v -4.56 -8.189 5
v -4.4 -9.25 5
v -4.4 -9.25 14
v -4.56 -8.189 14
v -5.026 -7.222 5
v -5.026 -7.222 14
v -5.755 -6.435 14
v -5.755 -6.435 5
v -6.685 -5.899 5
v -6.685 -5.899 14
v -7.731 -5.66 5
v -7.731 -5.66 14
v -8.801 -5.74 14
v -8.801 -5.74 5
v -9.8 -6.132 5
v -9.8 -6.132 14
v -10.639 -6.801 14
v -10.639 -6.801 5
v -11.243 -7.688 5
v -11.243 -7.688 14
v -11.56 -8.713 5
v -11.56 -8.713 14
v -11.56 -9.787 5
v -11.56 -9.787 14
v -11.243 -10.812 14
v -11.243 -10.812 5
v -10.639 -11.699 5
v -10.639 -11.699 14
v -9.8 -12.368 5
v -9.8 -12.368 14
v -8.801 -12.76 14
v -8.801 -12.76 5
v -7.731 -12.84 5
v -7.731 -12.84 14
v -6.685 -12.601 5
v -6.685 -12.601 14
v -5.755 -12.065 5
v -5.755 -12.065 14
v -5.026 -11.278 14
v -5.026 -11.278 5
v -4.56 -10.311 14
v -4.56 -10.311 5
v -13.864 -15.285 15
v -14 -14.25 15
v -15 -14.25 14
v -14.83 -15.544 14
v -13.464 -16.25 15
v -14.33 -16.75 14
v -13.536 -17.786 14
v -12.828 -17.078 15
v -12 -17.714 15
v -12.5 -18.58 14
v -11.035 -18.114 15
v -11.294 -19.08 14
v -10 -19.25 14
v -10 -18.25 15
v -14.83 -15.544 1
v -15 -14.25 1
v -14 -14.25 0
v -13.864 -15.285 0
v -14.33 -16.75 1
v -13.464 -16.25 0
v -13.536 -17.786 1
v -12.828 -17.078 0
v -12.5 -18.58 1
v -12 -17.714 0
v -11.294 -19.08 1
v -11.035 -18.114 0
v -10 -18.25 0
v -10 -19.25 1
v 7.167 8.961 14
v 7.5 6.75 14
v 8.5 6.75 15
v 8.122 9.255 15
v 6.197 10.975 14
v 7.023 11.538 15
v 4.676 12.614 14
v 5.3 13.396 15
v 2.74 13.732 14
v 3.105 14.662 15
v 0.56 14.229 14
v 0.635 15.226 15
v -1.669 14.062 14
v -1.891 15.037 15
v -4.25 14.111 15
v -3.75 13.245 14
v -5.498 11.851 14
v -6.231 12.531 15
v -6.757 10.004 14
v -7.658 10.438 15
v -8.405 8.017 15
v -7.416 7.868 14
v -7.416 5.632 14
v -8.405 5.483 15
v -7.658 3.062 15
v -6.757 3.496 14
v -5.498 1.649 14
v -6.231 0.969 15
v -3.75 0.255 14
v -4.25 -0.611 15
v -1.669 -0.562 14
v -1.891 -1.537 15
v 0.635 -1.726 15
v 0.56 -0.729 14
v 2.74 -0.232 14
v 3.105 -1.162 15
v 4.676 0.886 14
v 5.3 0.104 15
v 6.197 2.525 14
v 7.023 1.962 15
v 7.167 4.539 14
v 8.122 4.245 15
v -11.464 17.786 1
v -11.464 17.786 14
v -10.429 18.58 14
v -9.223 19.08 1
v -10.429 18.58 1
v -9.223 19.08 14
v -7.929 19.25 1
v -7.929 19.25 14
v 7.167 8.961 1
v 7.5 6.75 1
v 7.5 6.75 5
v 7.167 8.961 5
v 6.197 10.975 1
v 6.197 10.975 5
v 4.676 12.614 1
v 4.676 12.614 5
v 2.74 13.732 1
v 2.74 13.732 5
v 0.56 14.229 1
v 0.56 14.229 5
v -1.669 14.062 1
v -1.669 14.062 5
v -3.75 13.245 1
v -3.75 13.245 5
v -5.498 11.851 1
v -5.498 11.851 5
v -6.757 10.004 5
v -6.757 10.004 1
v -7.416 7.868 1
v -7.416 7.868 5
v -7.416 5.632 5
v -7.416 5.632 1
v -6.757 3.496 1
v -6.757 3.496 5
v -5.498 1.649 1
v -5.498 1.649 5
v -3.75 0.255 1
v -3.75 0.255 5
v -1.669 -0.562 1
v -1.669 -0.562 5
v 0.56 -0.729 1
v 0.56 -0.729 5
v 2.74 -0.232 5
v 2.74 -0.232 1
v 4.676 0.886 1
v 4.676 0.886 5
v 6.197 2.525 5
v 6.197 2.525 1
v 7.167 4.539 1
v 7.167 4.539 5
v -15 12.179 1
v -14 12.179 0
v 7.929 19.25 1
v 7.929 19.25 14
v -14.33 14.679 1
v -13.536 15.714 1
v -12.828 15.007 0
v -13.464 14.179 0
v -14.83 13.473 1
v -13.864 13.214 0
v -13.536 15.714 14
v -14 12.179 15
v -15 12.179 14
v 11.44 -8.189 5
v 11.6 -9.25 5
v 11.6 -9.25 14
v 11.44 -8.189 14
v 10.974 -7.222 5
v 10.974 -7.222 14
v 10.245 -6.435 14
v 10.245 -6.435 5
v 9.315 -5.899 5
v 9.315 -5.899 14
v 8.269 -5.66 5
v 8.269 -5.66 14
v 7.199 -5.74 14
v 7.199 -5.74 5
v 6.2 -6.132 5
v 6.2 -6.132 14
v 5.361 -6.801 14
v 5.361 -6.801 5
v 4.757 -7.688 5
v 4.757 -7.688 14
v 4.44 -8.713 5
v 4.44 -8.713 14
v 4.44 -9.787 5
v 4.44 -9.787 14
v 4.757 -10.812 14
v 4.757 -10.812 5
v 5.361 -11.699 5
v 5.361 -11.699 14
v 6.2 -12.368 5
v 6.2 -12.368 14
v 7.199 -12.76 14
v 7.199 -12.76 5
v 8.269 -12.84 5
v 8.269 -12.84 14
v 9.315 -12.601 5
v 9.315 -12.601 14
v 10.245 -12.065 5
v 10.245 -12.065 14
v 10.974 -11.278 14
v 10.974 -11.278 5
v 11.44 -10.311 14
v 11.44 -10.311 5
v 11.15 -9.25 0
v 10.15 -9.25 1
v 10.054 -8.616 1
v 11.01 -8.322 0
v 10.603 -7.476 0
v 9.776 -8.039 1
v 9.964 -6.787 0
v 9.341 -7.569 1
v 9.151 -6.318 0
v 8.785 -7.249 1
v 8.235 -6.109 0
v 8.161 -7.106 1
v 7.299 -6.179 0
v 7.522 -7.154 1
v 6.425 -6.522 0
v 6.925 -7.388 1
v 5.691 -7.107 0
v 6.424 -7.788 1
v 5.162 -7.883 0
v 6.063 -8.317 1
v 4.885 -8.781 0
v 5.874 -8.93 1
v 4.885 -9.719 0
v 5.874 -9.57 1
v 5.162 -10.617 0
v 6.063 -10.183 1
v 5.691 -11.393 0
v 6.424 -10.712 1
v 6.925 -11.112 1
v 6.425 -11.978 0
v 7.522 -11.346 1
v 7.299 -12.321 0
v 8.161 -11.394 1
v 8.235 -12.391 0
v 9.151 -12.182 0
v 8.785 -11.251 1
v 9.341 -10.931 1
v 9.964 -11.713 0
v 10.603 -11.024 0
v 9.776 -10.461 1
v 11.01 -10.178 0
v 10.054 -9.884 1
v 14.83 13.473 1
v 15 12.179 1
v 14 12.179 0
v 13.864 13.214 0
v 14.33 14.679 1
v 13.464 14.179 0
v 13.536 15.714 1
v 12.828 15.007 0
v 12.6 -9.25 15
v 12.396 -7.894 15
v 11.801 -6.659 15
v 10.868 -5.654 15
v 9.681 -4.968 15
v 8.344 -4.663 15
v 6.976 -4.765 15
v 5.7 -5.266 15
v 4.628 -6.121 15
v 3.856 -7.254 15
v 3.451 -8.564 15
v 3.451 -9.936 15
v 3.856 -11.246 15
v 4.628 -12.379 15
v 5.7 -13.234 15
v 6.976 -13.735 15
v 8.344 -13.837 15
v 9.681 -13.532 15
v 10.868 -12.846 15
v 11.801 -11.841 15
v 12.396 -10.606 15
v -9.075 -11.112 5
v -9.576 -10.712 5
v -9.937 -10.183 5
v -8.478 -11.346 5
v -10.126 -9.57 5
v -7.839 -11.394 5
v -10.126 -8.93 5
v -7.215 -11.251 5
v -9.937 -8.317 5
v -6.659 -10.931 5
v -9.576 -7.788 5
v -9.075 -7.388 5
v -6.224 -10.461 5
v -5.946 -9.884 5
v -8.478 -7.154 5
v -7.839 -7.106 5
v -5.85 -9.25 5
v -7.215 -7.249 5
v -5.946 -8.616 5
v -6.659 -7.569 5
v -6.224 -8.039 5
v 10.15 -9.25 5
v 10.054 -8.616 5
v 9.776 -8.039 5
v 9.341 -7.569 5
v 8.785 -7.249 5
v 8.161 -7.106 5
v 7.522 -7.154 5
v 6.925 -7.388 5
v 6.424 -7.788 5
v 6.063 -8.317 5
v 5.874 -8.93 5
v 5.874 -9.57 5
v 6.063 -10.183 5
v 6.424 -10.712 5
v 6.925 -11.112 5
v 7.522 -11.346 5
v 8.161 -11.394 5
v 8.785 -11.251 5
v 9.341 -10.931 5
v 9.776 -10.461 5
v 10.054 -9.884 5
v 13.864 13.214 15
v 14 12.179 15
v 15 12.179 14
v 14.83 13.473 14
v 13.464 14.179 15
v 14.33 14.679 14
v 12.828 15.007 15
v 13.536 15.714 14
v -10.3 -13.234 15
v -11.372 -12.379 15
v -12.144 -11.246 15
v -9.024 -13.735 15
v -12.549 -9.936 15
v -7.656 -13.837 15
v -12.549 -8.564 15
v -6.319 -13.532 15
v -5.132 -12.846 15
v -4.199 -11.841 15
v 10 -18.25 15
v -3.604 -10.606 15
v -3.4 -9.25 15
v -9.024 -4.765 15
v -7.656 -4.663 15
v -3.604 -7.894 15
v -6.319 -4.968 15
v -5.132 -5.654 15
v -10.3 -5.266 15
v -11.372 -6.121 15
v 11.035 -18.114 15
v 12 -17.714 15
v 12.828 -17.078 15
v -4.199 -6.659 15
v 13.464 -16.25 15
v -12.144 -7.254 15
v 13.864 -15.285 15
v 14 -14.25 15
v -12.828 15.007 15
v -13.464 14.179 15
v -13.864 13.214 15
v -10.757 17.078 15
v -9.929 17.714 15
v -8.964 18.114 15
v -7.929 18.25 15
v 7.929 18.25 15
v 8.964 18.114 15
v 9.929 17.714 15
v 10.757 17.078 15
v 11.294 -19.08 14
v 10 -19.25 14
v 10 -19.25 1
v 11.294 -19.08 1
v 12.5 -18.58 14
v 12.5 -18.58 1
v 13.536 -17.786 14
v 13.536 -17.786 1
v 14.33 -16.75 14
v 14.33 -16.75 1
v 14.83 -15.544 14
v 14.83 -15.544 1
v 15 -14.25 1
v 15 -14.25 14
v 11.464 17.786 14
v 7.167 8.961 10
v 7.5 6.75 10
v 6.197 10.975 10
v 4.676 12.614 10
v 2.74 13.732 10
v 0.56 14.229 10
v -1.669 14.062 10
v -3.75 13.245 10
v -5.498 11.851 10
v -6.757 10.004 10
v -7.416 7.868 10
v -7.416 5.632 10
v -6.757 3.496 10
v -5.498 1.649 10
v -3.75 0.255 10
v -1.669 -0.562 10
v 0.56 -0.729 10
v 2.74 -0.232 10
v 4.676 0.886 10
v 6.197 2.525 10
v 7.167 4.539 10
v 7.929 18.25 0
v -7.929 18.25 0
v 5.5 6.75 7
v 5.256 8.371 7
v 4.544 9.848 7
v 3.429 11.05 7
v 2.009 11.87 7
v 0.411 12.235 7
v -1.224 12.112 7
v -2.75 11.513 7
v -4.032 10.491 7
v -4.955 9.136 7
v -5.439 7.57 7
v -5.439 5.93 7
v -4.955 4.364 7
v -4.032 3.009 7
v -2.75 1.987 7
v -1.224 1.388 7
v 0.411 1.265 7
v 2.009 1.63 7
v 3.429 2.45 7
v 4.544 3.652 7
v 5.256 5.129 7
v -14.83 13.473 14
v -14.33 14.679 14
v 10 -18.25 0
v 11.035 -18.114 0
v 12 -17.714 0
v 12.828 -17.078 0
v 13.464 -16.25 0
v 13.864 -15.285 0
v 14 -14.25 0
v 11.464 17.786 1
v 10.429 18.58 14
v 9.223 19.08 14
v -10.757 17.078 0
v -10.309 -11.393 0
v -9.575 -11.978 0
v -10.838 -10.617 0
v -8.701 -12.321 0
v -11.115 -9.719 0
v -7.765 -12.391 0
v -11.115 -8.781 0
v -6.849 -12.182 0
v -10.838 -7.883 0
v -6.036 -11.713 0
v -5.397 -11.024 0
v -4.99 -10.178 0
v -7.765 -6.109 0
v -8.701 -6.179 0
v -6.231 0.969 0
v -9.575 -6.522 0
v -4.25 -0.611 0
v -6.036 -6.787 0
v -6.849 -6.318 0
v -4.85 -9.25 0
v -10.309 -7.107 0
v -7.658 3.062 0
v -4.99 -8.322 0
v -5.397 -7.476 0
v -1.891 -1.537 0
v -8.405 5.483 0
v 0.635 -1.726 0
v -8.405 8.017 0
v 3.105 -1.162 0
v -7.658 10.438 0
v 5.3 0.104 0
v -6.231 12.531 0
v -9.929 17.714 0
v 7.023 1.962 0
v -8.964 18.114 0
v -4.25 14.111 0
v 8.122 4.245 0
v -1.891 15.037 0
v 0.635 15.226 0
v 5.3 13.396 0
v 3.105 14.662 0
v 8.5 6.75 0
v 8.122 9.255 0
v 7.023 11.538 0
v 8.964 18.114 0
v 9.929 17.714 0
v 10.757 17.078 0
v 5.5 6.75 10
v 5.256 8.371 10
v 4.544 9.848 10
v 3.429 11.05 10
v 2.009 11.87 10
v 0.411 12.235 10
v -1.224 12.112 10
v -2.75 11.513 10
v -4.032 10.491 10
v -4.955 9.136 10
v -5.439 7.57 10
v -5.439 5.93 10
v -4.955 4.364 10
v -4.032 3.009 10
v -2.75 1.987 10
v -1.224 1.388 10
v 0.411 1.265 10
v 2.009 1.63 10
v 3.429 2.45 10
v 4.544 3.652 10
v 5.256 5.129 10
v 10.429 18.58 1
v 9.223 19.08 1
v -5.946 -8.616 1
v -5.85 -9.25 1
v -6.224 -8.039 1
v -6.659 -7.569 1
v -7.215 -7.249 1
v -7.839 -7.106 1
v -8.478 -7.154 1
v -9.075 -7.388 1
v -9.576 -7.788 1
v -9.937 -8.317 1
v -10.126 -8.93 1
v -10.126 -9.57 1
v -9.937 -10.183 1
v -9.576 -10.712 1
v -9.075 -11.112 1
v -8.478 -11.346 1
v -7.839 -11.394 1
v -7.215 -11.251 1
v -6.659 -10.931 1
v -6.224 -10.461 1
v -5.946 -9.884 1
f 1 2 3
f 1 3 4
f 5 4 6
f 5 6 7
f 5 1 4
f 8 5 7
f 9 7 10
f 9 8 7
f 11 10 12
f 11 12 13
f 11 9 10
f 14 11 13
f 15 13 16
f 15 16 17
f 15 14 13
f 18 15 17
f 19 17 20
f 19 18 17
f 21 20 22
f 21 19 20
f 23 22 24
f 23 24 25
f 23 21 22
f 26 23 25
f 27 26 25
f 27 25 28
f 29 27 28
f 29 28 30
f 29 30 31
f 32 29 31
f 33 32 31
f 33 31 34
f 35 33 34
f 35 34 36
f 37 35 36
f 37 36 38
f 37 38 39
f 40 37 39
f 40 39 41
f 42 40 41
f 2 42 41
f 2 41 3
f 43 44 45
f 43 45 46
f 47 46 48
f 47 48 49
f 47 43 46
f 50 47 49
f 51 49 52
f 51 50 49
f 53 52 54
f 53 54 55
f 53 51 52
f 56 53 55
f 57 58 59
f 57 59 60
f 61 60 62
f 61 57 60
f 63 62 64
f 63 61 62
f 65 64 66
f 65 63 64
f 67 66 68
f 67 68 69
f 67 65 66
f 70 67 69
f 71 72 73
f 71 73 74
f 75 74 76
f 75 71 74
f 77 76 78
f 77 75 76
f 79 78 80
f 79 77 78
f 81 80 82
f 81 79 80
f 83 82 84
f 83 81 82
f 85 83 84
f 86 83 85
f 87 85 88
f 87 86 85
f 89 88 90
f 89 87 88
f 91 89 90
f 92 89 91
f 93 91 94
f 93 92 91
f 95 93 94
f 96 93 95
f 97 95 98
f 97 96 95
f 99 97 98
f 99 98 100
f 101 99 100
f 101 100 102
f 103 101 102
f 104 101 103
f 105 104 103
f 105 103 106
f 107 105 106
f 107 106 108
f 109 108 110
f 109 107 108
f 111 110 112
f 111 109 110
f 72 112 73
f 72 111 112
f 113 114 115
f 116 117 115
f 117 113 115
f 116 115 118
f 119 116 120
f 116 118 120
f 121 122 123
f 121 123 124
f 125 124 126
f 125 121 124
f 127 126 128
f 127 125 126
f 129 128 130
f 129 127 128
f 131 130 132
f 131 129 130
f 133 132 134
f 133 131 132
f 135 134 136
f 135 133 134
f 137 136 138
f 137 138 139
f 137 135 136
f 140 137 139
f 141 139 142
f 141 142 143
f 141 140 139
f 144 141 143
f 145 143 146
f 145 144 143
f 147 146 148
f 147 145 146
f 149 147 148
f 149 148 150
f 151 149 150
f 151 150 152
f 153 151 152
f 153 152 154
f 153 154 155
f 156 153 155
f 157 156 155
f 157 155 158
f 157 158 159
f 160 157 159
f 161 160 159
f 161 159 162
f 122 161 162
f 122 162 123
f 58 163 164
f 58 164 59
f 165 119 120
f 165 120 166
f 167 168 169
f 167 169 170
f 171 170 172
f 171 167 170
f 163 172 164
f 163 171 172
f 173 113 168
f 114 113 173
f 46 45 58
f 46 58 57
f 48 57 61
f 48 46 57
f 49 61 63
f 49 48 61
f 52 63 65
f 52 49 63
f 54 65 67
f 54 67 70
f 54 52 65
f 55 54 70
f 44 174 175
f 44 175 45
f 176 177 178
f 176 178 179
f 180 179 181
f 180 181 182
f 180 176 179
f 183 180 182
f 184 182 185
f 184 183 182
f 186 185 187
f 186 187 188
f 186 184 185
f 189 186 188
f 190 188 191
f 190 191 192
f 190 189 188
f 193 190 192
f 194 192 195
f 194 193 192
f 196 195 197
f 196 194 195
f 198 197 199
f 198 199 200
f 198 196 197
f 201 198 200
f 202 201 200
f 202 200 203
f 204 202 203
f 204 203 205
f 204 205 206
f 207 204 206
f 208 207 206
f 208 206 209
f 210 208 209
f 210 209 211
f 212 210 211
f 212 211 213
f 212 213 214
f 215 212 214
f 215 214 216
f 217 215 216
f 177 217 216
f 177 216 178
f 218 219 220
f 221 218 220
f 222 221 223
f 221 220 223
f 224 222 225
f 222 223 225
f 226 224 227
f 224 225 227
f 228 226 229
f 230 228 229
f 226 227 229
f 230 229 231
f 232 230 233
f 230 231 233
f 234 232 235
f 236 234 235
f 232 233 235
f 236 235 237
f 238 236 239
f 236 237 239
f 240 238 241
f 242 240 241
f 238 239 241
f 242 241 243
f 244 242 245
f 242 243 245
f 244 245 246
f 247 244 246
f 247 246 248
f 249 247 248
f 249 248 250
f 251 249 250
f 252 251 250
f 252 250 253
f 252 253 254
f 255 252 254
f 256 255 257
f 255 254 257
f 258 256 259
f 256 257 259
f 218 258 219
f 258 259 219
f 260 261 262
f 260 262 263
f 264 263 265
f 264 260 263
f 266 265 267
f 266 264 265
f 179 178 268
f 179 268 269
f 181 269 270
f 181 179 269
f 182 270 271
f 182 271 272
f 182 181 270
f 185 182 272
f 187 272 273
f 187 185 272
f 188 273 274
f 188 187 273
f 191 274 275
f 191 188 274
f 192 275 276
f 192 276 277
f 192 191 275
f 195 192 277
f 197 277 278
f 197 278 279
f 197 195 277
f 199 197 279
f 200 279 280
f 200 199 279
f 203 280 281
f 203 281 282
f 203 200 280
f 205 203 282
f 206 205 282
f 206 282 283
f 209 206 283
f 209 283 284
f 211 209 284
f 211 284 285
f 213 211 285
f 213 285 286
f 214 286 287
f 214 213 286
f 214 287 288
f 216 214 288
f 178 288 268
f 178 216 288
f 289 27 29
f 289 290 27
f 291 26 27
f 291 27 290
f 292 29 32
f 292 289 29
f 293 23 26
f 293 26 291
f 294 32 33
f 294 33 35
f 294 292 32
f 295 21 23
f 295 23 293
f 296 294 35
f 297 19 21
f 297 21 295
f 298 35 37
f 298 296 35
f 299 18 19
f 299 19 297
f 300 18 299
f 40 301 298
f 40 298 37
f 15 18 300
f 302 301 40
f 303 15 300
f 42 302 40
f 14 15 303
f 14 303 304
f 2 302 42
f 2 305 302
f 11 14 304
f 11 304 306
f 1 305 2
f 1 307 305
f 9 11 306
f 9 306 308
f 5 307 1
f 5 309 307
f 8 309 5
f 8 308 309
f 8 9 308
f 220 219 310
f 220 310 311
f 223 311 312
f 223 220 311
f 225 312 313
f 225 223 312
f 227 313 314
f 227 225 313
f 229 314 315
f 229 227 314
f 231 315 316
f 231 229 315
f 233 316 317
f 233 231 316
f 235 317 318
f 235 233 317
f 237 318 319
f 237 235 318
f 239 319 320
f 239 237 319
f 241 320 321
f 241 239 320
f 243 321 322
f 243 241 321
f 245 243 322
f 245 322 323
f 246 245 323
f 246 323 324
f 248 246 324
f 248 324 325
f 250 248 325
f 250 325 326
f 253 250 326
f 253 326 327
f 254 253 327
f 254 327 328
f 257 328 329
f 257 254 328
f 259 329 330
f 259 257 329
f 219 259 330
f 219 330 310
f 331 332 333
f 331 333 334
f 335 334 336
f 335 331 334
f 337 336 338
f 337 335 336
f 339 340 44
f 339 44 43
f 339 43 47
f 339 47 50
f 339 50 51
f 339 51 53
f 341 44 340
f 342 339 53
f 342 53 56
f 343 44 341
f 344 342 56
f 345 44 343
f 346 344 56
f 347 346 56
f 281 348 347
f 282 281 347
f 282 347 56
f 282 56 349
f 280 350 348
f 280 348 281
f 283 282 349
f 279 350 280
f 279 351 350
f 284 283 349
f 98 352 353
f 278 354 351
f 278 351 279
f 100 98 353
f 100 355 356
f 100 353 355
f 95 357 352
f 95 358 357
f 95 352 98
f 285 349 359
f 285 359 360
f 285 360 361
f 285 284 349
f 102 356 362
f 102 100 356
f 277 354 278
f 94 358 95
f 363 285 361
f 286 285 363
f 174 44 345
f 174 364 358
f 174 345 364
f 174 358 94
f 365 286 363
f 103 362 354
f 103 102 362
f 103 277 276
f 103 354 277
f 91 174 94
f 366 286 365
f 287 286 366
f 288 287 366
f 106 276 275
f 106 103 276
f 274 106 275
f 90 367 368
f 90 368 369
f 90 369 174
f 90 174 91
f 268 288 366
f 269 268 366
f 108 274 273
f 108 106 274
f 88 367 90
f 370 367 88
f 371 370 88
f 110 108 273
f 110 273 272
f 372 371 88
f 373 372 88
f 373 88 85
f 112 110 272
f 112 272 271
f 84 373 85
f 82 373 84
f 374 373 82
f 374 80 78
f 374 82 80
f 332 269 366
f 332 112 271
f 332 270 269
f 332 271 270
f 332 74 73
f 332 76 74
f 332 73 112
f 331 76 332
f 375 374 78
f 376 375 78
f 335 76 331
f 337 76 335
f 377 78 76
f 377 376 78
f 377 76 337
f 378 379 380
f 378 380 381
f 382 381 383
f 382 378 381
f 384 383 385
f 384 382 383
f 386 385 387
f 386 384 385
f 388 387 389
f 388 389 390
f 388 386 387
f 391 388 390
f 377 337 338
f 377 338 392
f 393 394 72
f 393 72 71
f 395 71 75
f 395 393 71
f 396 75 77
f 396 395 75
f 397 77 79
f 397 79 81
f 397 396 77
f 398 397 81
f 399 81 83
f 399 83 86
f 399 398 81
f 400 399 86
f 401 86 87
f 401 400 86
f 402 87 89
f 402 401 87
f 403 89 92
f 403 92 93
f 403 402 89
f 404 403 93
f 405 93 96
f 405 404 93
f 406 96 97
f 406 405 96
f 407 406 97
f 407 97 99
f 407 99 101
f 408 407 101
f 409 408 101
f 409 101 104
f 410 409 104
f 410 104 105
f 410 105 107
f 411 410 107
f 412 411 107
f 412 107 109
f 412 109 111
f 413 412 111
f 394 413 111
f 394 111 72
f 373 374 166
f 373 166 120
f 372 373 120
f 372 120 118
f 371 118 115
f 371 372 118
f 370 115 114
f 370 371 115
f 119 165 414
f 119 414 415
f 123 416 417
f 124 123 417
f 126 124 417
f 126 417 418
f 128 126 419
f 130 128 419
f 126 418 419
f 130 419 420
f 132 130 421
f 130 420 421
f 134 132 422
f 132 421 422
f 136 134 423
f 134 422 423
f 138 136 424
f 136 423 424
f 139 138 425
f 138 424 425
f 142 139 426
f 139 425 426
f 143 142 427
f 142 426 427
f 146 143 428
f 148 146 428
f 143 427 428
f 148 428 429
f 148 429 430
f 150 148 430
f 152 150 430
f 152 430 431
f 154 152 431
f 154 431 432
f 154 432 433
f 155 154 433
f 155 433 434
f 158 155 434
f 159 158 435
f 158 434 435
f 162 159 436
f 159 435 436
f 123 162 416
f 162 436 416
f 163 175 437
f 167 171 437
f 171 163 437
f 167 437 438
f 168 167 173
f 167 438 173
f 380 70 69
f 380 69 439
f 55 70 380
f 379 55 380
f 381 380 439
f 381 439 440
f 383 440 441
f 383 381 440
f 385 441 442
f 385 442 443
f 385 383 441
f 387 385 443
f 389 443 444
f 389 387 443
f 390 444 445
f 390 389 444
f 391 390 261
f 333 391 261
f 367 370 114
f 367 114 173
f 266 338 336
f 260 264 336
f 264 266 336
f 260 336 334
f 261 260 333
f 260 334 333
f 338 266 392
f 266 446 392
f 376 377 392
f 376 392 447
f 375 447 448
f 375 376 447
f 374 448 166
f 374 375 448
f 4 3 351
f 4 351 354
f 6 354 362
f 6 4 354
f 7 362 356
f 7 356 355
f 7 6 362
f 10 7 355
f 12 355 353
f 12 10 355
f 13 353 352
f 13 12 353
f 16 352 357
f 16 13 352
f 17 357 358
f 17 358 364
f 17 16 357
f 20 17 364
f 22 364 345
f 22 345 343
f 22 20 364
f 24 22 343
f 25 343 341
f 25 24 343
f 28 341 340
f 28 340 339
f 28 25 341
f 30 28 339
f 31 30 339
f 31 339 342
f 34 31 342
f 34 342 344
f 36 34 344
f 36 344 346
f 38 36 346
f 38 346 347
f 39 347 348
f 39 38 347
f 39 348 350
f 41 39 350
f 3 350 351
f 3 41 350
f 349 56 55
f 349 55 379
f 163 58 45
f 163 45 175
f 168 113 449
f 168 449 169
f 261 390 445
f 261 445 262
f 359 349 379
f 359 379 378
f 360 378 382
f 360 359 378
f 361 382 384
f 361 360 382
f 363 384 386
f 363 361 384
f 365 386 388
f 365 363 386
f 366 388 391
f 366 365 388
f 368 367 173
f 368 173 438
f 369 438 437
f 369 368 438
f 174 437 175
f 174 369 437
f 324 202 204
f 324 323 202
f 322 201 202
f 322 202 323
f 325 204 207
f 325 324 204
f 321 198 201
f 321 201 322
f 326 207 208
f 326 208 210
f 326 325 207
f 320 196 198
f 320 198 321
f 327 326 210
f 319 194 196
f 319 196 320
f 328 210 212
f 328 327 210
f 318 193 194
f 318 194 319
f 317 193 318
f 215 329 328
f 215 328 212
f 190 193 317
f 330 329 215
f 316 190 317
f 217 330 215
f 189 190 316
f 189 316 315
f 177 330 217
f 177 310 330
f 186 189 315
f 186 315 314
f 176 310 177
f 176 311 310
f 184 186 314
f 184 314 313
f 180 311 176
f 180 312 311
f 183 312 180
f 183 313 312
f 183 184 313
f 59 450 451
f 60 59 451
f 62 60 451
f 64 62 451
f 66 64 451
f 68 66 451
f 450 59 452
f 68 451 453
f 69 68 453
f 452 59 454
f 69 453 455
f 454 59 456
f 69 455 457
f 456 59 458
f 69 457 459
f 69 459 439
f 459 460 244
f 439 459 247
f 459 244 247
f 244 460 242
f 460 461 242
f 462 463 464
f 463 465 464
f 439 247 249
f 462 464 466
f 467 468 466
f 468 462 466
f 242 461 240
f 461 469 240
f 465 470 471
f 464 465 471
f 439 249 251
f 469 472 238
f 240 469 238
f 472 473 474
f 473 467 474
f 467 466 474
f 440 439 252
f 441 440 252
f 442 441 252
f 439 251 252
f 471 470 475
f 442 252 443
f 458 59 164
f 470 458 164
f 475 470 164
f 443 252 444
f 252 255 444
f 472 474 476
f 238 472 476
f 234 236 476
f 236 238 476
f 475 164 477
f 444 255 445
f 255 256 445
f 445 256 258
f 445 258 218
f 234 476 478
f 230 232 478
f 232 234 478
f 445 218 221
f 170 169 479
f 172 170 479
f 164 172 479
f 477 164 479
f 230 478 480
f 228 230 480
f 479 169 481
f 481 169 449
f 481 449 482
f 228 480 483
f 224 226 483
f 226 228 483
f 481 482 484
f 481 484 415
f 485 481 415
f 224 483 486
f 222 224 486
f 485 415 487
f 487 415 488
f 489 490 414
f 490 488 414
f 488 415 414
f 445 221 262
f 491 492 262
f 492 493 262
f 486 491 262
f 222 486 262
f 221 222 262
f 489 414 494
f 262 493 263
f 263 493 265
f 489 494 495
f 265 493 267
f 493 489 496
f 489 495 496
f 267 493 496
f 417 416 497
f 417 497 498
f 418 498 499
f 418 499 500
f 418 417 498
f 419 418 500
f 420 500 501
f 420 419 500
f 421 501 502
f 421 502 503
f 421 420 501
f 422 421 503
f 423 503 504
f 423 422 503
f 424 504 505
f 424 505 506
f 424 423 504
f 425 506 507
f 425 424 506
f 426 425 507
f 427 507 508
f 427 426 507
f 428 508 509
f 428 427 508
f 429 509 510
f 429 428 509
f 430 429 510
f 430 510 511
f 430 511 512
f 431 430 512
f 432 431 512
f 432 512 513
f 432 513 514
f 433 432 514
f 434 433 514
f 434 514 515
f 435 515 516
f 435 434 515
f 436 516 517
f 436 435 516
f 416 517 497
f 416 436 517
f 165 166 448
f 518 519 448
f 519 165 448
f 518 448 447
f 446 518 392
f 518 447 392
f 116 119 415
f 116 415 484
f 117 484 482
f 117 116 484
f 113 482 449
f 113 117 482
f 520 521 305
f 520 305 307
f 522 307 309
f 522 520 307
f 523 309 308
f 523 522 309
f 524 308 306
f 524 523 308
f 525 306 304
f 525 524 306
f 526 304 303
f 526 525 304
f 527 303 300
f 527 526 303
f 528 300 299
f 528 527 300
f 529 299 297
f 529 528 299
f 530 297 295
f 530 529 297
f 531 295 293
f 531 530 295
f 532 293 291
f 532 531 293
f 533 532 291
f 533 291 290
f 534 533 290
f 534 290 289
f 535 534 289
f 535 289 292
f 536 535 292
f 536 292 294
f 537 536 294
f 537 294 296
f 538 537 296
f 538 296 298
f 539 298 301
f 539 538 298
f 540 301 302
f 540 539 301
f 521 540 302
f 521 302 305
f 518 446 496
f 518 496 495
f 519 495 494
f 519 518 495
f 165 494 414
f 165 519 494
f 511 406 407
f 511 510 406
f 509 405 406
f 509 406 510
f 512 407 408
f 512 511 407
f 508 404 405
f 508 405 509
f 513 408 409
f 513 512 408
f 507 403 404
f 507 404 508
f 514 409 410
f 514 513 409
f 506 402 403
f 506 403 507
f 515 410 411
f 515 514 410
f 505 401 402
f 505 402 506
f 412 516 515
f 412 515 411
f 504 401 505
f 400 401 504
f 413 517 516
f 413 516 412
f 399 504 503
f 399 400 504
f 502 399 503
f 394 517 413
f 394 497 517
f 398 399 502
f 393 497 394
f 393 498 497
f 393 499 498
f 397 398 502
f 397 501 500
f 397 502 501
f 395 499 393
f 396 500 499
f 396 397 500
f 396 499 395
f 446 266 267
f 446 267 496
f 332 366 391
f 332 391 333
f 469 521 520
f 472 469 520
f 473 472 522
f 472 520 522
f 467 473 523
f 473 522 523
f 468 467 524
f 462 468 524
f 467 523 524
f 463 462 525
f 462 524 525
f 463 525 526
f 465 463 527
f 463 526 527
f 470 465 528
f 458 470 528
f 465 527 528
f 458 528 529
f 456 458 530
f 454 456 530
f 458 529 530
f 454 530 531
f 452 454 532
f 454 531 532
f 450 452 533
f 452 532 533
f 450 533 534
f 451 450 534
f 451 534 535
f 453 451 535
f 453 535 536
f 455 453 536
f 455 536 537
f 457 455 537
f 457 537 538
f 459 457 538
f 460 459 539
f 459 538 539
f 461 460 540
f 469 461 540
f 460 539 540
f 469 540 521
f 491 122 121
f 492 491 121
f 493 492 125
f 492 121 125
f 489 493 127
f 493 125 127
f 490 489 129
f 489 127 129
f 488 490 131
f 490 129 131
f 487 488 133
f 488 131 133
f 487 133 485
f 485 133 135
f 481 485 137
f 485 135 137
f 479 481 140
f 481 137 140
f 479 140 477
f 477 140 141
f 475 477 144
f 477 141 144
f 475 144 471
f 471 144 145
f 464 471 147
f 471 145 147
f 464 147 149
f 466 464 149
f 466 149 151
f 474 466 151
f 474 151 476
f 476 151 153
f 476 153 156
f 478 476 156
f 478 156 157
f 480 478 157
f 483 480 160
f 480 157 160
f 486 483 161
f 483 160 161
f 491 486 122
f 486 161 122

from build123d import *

# Parameters (mm, degrees)
F0_W     = 30
F0_H     = 38.5
F0_R     = 3.6
F0_R_2   = 7.5
F1_DEPTH = 15
F0_R_3   = 2.15
F2_DEPTH = 5
F3_START = 5
F0_R_4   = 5.5
F3_DEPTH = 5
F4_SIZE  = 1.99999
F5_SIZE  = 5
F6_R     = 5
F7_R     = 5
F8_SIZE  = 1


# Not quite as in the source:
# - a fillet or chamfer is up to 0.001 mm smaller than in the source, because OpenCascade refuses the exact size


with BuildPart() as f1:
    # F0 (on Top) → F1 (new body)
    with BuildSketch(Plane.XY):
        Rectangle(F0_W, F0_H)
        with Locations((-8, -9.25)):
            Circle(F0_R, mode=Mode.SUBTRACT)
        with Locations((8, -9.25)):
            Circle(F0_R, mode=Mode.SUBTRACT)
        with Locations((0, 6.75)):
            Circle(F0_R_2, mode=Mode.SUBTRACT)
    extrude(amount=F1_DEPTH)

    # F0 (on Top) → F2 (join)
    with BuildSketch(Plane.XY):
        with Locations((-8, -9.25)):
            Circle(F0_R)
        with Locations((-8, -9.25)):
            Circle(F0_R_3, mode=Mode.SUBTRACT)
        with Locations((8, -9.25)):
            Circle(F0_R)
        with Locations((8, -9.25)):
            Circle(F0_R_3, mode=Mode.SUBTRACT)
    extrude(amount=F2_DEPTH)

    # F0 (on Top) → F3 (join)
    with BuildSketch(Plane.XY.offset(F3_START)):
        with Locations((0, 6.75)):
            Circle(F0_R_2)
        with Locations((0, 6.75)):
            Circle(F0_R_4, mode=Mode.SUBTRACT)
    extrude(amount=F3_DEPTH)

    # F4 (size 2 in the source; OpenCascade refuses exactly that, so slightly less here)
    f4_edges = [f1.edges().sort_by_distance(p)[0] for p in [
        (-5.5, 6.75, 5),
    ]]
    chamfer(f4_edges, length=F4_SIZE)

    # F5
    f5_edges = [f1.edges().sort_by_distance(p)[0] for p in [
        (15, 19.25, 7.5),
        (-15, 19.25, 7.5),
    ]]
    chamfer(f5_edges, length=F5_SIZE)

    # F6
    f6_edges = [f1.edges().sort_by_distance(p)[0] for p in [
        (15, -19.25, 7.5),
        (-15, -19.25, 7.5),
    ]]
    fillet(f6_edges, radius=F6_R)

    # F7
    f7_edges = [f1.edges().sort_by_distance(p)[0] for p in [
        (15, 14.25, 7.5),
        (10, 19.25, 7.5),
        (-10, 19.25, 7.5),
        (-15, 14.25, 7.5),
    ]]
    fillet(f7_edges, radius=F7_R)

    # F8
    f8_edges = [f1.edges().sort_by_distance(p)[0] for p in [
        (15, -1.035534, 15),
        (14.619398, 14.092349, 15),
        (13.535534, -17.785534, 15),
        (12.5, 16.75, 15),
        (0, -19.25, 15),
        (9.842349, 18.869398, 15),
        (-13.535534, -17.785534, 15),
        (0, 19.25, 15),
        (-15, -1.035534, 15),
        (-9.842349, 18.869398, 15),
        (-14.619398, 14.092349, 15),
        (-12.5, 16.75, 15),
        (-11.6, -9.25, 15),
        (4.4, -9.25, 15),
        (-7.5, 6.75, 15),
        (15, -1.035534, 0),
        (14.619398, 14.092349, 0),
        (13.535534, -17.785534, 0),
        (12.5, 16.75, 0),
        (0, -19.25, 0),
        (9.842349, 18.869398, 0),
        (-13.535534, -17.785534, 0),
        (0, 19.25, 0),
        (-15, -1.035534, 0),
        (-9.842349, 18.869398, 0),
        (-14.619398, 14.092349, 0),
        (-12.5, 16.75, 0),
        (-7.5, 6.75, 0),
        (-10.15, -9.25, 0),
        (5.85, -9.25, 0),
    ]]
    chamfer(f8_edges, length=F8_SIZE)


solid = f1.part
